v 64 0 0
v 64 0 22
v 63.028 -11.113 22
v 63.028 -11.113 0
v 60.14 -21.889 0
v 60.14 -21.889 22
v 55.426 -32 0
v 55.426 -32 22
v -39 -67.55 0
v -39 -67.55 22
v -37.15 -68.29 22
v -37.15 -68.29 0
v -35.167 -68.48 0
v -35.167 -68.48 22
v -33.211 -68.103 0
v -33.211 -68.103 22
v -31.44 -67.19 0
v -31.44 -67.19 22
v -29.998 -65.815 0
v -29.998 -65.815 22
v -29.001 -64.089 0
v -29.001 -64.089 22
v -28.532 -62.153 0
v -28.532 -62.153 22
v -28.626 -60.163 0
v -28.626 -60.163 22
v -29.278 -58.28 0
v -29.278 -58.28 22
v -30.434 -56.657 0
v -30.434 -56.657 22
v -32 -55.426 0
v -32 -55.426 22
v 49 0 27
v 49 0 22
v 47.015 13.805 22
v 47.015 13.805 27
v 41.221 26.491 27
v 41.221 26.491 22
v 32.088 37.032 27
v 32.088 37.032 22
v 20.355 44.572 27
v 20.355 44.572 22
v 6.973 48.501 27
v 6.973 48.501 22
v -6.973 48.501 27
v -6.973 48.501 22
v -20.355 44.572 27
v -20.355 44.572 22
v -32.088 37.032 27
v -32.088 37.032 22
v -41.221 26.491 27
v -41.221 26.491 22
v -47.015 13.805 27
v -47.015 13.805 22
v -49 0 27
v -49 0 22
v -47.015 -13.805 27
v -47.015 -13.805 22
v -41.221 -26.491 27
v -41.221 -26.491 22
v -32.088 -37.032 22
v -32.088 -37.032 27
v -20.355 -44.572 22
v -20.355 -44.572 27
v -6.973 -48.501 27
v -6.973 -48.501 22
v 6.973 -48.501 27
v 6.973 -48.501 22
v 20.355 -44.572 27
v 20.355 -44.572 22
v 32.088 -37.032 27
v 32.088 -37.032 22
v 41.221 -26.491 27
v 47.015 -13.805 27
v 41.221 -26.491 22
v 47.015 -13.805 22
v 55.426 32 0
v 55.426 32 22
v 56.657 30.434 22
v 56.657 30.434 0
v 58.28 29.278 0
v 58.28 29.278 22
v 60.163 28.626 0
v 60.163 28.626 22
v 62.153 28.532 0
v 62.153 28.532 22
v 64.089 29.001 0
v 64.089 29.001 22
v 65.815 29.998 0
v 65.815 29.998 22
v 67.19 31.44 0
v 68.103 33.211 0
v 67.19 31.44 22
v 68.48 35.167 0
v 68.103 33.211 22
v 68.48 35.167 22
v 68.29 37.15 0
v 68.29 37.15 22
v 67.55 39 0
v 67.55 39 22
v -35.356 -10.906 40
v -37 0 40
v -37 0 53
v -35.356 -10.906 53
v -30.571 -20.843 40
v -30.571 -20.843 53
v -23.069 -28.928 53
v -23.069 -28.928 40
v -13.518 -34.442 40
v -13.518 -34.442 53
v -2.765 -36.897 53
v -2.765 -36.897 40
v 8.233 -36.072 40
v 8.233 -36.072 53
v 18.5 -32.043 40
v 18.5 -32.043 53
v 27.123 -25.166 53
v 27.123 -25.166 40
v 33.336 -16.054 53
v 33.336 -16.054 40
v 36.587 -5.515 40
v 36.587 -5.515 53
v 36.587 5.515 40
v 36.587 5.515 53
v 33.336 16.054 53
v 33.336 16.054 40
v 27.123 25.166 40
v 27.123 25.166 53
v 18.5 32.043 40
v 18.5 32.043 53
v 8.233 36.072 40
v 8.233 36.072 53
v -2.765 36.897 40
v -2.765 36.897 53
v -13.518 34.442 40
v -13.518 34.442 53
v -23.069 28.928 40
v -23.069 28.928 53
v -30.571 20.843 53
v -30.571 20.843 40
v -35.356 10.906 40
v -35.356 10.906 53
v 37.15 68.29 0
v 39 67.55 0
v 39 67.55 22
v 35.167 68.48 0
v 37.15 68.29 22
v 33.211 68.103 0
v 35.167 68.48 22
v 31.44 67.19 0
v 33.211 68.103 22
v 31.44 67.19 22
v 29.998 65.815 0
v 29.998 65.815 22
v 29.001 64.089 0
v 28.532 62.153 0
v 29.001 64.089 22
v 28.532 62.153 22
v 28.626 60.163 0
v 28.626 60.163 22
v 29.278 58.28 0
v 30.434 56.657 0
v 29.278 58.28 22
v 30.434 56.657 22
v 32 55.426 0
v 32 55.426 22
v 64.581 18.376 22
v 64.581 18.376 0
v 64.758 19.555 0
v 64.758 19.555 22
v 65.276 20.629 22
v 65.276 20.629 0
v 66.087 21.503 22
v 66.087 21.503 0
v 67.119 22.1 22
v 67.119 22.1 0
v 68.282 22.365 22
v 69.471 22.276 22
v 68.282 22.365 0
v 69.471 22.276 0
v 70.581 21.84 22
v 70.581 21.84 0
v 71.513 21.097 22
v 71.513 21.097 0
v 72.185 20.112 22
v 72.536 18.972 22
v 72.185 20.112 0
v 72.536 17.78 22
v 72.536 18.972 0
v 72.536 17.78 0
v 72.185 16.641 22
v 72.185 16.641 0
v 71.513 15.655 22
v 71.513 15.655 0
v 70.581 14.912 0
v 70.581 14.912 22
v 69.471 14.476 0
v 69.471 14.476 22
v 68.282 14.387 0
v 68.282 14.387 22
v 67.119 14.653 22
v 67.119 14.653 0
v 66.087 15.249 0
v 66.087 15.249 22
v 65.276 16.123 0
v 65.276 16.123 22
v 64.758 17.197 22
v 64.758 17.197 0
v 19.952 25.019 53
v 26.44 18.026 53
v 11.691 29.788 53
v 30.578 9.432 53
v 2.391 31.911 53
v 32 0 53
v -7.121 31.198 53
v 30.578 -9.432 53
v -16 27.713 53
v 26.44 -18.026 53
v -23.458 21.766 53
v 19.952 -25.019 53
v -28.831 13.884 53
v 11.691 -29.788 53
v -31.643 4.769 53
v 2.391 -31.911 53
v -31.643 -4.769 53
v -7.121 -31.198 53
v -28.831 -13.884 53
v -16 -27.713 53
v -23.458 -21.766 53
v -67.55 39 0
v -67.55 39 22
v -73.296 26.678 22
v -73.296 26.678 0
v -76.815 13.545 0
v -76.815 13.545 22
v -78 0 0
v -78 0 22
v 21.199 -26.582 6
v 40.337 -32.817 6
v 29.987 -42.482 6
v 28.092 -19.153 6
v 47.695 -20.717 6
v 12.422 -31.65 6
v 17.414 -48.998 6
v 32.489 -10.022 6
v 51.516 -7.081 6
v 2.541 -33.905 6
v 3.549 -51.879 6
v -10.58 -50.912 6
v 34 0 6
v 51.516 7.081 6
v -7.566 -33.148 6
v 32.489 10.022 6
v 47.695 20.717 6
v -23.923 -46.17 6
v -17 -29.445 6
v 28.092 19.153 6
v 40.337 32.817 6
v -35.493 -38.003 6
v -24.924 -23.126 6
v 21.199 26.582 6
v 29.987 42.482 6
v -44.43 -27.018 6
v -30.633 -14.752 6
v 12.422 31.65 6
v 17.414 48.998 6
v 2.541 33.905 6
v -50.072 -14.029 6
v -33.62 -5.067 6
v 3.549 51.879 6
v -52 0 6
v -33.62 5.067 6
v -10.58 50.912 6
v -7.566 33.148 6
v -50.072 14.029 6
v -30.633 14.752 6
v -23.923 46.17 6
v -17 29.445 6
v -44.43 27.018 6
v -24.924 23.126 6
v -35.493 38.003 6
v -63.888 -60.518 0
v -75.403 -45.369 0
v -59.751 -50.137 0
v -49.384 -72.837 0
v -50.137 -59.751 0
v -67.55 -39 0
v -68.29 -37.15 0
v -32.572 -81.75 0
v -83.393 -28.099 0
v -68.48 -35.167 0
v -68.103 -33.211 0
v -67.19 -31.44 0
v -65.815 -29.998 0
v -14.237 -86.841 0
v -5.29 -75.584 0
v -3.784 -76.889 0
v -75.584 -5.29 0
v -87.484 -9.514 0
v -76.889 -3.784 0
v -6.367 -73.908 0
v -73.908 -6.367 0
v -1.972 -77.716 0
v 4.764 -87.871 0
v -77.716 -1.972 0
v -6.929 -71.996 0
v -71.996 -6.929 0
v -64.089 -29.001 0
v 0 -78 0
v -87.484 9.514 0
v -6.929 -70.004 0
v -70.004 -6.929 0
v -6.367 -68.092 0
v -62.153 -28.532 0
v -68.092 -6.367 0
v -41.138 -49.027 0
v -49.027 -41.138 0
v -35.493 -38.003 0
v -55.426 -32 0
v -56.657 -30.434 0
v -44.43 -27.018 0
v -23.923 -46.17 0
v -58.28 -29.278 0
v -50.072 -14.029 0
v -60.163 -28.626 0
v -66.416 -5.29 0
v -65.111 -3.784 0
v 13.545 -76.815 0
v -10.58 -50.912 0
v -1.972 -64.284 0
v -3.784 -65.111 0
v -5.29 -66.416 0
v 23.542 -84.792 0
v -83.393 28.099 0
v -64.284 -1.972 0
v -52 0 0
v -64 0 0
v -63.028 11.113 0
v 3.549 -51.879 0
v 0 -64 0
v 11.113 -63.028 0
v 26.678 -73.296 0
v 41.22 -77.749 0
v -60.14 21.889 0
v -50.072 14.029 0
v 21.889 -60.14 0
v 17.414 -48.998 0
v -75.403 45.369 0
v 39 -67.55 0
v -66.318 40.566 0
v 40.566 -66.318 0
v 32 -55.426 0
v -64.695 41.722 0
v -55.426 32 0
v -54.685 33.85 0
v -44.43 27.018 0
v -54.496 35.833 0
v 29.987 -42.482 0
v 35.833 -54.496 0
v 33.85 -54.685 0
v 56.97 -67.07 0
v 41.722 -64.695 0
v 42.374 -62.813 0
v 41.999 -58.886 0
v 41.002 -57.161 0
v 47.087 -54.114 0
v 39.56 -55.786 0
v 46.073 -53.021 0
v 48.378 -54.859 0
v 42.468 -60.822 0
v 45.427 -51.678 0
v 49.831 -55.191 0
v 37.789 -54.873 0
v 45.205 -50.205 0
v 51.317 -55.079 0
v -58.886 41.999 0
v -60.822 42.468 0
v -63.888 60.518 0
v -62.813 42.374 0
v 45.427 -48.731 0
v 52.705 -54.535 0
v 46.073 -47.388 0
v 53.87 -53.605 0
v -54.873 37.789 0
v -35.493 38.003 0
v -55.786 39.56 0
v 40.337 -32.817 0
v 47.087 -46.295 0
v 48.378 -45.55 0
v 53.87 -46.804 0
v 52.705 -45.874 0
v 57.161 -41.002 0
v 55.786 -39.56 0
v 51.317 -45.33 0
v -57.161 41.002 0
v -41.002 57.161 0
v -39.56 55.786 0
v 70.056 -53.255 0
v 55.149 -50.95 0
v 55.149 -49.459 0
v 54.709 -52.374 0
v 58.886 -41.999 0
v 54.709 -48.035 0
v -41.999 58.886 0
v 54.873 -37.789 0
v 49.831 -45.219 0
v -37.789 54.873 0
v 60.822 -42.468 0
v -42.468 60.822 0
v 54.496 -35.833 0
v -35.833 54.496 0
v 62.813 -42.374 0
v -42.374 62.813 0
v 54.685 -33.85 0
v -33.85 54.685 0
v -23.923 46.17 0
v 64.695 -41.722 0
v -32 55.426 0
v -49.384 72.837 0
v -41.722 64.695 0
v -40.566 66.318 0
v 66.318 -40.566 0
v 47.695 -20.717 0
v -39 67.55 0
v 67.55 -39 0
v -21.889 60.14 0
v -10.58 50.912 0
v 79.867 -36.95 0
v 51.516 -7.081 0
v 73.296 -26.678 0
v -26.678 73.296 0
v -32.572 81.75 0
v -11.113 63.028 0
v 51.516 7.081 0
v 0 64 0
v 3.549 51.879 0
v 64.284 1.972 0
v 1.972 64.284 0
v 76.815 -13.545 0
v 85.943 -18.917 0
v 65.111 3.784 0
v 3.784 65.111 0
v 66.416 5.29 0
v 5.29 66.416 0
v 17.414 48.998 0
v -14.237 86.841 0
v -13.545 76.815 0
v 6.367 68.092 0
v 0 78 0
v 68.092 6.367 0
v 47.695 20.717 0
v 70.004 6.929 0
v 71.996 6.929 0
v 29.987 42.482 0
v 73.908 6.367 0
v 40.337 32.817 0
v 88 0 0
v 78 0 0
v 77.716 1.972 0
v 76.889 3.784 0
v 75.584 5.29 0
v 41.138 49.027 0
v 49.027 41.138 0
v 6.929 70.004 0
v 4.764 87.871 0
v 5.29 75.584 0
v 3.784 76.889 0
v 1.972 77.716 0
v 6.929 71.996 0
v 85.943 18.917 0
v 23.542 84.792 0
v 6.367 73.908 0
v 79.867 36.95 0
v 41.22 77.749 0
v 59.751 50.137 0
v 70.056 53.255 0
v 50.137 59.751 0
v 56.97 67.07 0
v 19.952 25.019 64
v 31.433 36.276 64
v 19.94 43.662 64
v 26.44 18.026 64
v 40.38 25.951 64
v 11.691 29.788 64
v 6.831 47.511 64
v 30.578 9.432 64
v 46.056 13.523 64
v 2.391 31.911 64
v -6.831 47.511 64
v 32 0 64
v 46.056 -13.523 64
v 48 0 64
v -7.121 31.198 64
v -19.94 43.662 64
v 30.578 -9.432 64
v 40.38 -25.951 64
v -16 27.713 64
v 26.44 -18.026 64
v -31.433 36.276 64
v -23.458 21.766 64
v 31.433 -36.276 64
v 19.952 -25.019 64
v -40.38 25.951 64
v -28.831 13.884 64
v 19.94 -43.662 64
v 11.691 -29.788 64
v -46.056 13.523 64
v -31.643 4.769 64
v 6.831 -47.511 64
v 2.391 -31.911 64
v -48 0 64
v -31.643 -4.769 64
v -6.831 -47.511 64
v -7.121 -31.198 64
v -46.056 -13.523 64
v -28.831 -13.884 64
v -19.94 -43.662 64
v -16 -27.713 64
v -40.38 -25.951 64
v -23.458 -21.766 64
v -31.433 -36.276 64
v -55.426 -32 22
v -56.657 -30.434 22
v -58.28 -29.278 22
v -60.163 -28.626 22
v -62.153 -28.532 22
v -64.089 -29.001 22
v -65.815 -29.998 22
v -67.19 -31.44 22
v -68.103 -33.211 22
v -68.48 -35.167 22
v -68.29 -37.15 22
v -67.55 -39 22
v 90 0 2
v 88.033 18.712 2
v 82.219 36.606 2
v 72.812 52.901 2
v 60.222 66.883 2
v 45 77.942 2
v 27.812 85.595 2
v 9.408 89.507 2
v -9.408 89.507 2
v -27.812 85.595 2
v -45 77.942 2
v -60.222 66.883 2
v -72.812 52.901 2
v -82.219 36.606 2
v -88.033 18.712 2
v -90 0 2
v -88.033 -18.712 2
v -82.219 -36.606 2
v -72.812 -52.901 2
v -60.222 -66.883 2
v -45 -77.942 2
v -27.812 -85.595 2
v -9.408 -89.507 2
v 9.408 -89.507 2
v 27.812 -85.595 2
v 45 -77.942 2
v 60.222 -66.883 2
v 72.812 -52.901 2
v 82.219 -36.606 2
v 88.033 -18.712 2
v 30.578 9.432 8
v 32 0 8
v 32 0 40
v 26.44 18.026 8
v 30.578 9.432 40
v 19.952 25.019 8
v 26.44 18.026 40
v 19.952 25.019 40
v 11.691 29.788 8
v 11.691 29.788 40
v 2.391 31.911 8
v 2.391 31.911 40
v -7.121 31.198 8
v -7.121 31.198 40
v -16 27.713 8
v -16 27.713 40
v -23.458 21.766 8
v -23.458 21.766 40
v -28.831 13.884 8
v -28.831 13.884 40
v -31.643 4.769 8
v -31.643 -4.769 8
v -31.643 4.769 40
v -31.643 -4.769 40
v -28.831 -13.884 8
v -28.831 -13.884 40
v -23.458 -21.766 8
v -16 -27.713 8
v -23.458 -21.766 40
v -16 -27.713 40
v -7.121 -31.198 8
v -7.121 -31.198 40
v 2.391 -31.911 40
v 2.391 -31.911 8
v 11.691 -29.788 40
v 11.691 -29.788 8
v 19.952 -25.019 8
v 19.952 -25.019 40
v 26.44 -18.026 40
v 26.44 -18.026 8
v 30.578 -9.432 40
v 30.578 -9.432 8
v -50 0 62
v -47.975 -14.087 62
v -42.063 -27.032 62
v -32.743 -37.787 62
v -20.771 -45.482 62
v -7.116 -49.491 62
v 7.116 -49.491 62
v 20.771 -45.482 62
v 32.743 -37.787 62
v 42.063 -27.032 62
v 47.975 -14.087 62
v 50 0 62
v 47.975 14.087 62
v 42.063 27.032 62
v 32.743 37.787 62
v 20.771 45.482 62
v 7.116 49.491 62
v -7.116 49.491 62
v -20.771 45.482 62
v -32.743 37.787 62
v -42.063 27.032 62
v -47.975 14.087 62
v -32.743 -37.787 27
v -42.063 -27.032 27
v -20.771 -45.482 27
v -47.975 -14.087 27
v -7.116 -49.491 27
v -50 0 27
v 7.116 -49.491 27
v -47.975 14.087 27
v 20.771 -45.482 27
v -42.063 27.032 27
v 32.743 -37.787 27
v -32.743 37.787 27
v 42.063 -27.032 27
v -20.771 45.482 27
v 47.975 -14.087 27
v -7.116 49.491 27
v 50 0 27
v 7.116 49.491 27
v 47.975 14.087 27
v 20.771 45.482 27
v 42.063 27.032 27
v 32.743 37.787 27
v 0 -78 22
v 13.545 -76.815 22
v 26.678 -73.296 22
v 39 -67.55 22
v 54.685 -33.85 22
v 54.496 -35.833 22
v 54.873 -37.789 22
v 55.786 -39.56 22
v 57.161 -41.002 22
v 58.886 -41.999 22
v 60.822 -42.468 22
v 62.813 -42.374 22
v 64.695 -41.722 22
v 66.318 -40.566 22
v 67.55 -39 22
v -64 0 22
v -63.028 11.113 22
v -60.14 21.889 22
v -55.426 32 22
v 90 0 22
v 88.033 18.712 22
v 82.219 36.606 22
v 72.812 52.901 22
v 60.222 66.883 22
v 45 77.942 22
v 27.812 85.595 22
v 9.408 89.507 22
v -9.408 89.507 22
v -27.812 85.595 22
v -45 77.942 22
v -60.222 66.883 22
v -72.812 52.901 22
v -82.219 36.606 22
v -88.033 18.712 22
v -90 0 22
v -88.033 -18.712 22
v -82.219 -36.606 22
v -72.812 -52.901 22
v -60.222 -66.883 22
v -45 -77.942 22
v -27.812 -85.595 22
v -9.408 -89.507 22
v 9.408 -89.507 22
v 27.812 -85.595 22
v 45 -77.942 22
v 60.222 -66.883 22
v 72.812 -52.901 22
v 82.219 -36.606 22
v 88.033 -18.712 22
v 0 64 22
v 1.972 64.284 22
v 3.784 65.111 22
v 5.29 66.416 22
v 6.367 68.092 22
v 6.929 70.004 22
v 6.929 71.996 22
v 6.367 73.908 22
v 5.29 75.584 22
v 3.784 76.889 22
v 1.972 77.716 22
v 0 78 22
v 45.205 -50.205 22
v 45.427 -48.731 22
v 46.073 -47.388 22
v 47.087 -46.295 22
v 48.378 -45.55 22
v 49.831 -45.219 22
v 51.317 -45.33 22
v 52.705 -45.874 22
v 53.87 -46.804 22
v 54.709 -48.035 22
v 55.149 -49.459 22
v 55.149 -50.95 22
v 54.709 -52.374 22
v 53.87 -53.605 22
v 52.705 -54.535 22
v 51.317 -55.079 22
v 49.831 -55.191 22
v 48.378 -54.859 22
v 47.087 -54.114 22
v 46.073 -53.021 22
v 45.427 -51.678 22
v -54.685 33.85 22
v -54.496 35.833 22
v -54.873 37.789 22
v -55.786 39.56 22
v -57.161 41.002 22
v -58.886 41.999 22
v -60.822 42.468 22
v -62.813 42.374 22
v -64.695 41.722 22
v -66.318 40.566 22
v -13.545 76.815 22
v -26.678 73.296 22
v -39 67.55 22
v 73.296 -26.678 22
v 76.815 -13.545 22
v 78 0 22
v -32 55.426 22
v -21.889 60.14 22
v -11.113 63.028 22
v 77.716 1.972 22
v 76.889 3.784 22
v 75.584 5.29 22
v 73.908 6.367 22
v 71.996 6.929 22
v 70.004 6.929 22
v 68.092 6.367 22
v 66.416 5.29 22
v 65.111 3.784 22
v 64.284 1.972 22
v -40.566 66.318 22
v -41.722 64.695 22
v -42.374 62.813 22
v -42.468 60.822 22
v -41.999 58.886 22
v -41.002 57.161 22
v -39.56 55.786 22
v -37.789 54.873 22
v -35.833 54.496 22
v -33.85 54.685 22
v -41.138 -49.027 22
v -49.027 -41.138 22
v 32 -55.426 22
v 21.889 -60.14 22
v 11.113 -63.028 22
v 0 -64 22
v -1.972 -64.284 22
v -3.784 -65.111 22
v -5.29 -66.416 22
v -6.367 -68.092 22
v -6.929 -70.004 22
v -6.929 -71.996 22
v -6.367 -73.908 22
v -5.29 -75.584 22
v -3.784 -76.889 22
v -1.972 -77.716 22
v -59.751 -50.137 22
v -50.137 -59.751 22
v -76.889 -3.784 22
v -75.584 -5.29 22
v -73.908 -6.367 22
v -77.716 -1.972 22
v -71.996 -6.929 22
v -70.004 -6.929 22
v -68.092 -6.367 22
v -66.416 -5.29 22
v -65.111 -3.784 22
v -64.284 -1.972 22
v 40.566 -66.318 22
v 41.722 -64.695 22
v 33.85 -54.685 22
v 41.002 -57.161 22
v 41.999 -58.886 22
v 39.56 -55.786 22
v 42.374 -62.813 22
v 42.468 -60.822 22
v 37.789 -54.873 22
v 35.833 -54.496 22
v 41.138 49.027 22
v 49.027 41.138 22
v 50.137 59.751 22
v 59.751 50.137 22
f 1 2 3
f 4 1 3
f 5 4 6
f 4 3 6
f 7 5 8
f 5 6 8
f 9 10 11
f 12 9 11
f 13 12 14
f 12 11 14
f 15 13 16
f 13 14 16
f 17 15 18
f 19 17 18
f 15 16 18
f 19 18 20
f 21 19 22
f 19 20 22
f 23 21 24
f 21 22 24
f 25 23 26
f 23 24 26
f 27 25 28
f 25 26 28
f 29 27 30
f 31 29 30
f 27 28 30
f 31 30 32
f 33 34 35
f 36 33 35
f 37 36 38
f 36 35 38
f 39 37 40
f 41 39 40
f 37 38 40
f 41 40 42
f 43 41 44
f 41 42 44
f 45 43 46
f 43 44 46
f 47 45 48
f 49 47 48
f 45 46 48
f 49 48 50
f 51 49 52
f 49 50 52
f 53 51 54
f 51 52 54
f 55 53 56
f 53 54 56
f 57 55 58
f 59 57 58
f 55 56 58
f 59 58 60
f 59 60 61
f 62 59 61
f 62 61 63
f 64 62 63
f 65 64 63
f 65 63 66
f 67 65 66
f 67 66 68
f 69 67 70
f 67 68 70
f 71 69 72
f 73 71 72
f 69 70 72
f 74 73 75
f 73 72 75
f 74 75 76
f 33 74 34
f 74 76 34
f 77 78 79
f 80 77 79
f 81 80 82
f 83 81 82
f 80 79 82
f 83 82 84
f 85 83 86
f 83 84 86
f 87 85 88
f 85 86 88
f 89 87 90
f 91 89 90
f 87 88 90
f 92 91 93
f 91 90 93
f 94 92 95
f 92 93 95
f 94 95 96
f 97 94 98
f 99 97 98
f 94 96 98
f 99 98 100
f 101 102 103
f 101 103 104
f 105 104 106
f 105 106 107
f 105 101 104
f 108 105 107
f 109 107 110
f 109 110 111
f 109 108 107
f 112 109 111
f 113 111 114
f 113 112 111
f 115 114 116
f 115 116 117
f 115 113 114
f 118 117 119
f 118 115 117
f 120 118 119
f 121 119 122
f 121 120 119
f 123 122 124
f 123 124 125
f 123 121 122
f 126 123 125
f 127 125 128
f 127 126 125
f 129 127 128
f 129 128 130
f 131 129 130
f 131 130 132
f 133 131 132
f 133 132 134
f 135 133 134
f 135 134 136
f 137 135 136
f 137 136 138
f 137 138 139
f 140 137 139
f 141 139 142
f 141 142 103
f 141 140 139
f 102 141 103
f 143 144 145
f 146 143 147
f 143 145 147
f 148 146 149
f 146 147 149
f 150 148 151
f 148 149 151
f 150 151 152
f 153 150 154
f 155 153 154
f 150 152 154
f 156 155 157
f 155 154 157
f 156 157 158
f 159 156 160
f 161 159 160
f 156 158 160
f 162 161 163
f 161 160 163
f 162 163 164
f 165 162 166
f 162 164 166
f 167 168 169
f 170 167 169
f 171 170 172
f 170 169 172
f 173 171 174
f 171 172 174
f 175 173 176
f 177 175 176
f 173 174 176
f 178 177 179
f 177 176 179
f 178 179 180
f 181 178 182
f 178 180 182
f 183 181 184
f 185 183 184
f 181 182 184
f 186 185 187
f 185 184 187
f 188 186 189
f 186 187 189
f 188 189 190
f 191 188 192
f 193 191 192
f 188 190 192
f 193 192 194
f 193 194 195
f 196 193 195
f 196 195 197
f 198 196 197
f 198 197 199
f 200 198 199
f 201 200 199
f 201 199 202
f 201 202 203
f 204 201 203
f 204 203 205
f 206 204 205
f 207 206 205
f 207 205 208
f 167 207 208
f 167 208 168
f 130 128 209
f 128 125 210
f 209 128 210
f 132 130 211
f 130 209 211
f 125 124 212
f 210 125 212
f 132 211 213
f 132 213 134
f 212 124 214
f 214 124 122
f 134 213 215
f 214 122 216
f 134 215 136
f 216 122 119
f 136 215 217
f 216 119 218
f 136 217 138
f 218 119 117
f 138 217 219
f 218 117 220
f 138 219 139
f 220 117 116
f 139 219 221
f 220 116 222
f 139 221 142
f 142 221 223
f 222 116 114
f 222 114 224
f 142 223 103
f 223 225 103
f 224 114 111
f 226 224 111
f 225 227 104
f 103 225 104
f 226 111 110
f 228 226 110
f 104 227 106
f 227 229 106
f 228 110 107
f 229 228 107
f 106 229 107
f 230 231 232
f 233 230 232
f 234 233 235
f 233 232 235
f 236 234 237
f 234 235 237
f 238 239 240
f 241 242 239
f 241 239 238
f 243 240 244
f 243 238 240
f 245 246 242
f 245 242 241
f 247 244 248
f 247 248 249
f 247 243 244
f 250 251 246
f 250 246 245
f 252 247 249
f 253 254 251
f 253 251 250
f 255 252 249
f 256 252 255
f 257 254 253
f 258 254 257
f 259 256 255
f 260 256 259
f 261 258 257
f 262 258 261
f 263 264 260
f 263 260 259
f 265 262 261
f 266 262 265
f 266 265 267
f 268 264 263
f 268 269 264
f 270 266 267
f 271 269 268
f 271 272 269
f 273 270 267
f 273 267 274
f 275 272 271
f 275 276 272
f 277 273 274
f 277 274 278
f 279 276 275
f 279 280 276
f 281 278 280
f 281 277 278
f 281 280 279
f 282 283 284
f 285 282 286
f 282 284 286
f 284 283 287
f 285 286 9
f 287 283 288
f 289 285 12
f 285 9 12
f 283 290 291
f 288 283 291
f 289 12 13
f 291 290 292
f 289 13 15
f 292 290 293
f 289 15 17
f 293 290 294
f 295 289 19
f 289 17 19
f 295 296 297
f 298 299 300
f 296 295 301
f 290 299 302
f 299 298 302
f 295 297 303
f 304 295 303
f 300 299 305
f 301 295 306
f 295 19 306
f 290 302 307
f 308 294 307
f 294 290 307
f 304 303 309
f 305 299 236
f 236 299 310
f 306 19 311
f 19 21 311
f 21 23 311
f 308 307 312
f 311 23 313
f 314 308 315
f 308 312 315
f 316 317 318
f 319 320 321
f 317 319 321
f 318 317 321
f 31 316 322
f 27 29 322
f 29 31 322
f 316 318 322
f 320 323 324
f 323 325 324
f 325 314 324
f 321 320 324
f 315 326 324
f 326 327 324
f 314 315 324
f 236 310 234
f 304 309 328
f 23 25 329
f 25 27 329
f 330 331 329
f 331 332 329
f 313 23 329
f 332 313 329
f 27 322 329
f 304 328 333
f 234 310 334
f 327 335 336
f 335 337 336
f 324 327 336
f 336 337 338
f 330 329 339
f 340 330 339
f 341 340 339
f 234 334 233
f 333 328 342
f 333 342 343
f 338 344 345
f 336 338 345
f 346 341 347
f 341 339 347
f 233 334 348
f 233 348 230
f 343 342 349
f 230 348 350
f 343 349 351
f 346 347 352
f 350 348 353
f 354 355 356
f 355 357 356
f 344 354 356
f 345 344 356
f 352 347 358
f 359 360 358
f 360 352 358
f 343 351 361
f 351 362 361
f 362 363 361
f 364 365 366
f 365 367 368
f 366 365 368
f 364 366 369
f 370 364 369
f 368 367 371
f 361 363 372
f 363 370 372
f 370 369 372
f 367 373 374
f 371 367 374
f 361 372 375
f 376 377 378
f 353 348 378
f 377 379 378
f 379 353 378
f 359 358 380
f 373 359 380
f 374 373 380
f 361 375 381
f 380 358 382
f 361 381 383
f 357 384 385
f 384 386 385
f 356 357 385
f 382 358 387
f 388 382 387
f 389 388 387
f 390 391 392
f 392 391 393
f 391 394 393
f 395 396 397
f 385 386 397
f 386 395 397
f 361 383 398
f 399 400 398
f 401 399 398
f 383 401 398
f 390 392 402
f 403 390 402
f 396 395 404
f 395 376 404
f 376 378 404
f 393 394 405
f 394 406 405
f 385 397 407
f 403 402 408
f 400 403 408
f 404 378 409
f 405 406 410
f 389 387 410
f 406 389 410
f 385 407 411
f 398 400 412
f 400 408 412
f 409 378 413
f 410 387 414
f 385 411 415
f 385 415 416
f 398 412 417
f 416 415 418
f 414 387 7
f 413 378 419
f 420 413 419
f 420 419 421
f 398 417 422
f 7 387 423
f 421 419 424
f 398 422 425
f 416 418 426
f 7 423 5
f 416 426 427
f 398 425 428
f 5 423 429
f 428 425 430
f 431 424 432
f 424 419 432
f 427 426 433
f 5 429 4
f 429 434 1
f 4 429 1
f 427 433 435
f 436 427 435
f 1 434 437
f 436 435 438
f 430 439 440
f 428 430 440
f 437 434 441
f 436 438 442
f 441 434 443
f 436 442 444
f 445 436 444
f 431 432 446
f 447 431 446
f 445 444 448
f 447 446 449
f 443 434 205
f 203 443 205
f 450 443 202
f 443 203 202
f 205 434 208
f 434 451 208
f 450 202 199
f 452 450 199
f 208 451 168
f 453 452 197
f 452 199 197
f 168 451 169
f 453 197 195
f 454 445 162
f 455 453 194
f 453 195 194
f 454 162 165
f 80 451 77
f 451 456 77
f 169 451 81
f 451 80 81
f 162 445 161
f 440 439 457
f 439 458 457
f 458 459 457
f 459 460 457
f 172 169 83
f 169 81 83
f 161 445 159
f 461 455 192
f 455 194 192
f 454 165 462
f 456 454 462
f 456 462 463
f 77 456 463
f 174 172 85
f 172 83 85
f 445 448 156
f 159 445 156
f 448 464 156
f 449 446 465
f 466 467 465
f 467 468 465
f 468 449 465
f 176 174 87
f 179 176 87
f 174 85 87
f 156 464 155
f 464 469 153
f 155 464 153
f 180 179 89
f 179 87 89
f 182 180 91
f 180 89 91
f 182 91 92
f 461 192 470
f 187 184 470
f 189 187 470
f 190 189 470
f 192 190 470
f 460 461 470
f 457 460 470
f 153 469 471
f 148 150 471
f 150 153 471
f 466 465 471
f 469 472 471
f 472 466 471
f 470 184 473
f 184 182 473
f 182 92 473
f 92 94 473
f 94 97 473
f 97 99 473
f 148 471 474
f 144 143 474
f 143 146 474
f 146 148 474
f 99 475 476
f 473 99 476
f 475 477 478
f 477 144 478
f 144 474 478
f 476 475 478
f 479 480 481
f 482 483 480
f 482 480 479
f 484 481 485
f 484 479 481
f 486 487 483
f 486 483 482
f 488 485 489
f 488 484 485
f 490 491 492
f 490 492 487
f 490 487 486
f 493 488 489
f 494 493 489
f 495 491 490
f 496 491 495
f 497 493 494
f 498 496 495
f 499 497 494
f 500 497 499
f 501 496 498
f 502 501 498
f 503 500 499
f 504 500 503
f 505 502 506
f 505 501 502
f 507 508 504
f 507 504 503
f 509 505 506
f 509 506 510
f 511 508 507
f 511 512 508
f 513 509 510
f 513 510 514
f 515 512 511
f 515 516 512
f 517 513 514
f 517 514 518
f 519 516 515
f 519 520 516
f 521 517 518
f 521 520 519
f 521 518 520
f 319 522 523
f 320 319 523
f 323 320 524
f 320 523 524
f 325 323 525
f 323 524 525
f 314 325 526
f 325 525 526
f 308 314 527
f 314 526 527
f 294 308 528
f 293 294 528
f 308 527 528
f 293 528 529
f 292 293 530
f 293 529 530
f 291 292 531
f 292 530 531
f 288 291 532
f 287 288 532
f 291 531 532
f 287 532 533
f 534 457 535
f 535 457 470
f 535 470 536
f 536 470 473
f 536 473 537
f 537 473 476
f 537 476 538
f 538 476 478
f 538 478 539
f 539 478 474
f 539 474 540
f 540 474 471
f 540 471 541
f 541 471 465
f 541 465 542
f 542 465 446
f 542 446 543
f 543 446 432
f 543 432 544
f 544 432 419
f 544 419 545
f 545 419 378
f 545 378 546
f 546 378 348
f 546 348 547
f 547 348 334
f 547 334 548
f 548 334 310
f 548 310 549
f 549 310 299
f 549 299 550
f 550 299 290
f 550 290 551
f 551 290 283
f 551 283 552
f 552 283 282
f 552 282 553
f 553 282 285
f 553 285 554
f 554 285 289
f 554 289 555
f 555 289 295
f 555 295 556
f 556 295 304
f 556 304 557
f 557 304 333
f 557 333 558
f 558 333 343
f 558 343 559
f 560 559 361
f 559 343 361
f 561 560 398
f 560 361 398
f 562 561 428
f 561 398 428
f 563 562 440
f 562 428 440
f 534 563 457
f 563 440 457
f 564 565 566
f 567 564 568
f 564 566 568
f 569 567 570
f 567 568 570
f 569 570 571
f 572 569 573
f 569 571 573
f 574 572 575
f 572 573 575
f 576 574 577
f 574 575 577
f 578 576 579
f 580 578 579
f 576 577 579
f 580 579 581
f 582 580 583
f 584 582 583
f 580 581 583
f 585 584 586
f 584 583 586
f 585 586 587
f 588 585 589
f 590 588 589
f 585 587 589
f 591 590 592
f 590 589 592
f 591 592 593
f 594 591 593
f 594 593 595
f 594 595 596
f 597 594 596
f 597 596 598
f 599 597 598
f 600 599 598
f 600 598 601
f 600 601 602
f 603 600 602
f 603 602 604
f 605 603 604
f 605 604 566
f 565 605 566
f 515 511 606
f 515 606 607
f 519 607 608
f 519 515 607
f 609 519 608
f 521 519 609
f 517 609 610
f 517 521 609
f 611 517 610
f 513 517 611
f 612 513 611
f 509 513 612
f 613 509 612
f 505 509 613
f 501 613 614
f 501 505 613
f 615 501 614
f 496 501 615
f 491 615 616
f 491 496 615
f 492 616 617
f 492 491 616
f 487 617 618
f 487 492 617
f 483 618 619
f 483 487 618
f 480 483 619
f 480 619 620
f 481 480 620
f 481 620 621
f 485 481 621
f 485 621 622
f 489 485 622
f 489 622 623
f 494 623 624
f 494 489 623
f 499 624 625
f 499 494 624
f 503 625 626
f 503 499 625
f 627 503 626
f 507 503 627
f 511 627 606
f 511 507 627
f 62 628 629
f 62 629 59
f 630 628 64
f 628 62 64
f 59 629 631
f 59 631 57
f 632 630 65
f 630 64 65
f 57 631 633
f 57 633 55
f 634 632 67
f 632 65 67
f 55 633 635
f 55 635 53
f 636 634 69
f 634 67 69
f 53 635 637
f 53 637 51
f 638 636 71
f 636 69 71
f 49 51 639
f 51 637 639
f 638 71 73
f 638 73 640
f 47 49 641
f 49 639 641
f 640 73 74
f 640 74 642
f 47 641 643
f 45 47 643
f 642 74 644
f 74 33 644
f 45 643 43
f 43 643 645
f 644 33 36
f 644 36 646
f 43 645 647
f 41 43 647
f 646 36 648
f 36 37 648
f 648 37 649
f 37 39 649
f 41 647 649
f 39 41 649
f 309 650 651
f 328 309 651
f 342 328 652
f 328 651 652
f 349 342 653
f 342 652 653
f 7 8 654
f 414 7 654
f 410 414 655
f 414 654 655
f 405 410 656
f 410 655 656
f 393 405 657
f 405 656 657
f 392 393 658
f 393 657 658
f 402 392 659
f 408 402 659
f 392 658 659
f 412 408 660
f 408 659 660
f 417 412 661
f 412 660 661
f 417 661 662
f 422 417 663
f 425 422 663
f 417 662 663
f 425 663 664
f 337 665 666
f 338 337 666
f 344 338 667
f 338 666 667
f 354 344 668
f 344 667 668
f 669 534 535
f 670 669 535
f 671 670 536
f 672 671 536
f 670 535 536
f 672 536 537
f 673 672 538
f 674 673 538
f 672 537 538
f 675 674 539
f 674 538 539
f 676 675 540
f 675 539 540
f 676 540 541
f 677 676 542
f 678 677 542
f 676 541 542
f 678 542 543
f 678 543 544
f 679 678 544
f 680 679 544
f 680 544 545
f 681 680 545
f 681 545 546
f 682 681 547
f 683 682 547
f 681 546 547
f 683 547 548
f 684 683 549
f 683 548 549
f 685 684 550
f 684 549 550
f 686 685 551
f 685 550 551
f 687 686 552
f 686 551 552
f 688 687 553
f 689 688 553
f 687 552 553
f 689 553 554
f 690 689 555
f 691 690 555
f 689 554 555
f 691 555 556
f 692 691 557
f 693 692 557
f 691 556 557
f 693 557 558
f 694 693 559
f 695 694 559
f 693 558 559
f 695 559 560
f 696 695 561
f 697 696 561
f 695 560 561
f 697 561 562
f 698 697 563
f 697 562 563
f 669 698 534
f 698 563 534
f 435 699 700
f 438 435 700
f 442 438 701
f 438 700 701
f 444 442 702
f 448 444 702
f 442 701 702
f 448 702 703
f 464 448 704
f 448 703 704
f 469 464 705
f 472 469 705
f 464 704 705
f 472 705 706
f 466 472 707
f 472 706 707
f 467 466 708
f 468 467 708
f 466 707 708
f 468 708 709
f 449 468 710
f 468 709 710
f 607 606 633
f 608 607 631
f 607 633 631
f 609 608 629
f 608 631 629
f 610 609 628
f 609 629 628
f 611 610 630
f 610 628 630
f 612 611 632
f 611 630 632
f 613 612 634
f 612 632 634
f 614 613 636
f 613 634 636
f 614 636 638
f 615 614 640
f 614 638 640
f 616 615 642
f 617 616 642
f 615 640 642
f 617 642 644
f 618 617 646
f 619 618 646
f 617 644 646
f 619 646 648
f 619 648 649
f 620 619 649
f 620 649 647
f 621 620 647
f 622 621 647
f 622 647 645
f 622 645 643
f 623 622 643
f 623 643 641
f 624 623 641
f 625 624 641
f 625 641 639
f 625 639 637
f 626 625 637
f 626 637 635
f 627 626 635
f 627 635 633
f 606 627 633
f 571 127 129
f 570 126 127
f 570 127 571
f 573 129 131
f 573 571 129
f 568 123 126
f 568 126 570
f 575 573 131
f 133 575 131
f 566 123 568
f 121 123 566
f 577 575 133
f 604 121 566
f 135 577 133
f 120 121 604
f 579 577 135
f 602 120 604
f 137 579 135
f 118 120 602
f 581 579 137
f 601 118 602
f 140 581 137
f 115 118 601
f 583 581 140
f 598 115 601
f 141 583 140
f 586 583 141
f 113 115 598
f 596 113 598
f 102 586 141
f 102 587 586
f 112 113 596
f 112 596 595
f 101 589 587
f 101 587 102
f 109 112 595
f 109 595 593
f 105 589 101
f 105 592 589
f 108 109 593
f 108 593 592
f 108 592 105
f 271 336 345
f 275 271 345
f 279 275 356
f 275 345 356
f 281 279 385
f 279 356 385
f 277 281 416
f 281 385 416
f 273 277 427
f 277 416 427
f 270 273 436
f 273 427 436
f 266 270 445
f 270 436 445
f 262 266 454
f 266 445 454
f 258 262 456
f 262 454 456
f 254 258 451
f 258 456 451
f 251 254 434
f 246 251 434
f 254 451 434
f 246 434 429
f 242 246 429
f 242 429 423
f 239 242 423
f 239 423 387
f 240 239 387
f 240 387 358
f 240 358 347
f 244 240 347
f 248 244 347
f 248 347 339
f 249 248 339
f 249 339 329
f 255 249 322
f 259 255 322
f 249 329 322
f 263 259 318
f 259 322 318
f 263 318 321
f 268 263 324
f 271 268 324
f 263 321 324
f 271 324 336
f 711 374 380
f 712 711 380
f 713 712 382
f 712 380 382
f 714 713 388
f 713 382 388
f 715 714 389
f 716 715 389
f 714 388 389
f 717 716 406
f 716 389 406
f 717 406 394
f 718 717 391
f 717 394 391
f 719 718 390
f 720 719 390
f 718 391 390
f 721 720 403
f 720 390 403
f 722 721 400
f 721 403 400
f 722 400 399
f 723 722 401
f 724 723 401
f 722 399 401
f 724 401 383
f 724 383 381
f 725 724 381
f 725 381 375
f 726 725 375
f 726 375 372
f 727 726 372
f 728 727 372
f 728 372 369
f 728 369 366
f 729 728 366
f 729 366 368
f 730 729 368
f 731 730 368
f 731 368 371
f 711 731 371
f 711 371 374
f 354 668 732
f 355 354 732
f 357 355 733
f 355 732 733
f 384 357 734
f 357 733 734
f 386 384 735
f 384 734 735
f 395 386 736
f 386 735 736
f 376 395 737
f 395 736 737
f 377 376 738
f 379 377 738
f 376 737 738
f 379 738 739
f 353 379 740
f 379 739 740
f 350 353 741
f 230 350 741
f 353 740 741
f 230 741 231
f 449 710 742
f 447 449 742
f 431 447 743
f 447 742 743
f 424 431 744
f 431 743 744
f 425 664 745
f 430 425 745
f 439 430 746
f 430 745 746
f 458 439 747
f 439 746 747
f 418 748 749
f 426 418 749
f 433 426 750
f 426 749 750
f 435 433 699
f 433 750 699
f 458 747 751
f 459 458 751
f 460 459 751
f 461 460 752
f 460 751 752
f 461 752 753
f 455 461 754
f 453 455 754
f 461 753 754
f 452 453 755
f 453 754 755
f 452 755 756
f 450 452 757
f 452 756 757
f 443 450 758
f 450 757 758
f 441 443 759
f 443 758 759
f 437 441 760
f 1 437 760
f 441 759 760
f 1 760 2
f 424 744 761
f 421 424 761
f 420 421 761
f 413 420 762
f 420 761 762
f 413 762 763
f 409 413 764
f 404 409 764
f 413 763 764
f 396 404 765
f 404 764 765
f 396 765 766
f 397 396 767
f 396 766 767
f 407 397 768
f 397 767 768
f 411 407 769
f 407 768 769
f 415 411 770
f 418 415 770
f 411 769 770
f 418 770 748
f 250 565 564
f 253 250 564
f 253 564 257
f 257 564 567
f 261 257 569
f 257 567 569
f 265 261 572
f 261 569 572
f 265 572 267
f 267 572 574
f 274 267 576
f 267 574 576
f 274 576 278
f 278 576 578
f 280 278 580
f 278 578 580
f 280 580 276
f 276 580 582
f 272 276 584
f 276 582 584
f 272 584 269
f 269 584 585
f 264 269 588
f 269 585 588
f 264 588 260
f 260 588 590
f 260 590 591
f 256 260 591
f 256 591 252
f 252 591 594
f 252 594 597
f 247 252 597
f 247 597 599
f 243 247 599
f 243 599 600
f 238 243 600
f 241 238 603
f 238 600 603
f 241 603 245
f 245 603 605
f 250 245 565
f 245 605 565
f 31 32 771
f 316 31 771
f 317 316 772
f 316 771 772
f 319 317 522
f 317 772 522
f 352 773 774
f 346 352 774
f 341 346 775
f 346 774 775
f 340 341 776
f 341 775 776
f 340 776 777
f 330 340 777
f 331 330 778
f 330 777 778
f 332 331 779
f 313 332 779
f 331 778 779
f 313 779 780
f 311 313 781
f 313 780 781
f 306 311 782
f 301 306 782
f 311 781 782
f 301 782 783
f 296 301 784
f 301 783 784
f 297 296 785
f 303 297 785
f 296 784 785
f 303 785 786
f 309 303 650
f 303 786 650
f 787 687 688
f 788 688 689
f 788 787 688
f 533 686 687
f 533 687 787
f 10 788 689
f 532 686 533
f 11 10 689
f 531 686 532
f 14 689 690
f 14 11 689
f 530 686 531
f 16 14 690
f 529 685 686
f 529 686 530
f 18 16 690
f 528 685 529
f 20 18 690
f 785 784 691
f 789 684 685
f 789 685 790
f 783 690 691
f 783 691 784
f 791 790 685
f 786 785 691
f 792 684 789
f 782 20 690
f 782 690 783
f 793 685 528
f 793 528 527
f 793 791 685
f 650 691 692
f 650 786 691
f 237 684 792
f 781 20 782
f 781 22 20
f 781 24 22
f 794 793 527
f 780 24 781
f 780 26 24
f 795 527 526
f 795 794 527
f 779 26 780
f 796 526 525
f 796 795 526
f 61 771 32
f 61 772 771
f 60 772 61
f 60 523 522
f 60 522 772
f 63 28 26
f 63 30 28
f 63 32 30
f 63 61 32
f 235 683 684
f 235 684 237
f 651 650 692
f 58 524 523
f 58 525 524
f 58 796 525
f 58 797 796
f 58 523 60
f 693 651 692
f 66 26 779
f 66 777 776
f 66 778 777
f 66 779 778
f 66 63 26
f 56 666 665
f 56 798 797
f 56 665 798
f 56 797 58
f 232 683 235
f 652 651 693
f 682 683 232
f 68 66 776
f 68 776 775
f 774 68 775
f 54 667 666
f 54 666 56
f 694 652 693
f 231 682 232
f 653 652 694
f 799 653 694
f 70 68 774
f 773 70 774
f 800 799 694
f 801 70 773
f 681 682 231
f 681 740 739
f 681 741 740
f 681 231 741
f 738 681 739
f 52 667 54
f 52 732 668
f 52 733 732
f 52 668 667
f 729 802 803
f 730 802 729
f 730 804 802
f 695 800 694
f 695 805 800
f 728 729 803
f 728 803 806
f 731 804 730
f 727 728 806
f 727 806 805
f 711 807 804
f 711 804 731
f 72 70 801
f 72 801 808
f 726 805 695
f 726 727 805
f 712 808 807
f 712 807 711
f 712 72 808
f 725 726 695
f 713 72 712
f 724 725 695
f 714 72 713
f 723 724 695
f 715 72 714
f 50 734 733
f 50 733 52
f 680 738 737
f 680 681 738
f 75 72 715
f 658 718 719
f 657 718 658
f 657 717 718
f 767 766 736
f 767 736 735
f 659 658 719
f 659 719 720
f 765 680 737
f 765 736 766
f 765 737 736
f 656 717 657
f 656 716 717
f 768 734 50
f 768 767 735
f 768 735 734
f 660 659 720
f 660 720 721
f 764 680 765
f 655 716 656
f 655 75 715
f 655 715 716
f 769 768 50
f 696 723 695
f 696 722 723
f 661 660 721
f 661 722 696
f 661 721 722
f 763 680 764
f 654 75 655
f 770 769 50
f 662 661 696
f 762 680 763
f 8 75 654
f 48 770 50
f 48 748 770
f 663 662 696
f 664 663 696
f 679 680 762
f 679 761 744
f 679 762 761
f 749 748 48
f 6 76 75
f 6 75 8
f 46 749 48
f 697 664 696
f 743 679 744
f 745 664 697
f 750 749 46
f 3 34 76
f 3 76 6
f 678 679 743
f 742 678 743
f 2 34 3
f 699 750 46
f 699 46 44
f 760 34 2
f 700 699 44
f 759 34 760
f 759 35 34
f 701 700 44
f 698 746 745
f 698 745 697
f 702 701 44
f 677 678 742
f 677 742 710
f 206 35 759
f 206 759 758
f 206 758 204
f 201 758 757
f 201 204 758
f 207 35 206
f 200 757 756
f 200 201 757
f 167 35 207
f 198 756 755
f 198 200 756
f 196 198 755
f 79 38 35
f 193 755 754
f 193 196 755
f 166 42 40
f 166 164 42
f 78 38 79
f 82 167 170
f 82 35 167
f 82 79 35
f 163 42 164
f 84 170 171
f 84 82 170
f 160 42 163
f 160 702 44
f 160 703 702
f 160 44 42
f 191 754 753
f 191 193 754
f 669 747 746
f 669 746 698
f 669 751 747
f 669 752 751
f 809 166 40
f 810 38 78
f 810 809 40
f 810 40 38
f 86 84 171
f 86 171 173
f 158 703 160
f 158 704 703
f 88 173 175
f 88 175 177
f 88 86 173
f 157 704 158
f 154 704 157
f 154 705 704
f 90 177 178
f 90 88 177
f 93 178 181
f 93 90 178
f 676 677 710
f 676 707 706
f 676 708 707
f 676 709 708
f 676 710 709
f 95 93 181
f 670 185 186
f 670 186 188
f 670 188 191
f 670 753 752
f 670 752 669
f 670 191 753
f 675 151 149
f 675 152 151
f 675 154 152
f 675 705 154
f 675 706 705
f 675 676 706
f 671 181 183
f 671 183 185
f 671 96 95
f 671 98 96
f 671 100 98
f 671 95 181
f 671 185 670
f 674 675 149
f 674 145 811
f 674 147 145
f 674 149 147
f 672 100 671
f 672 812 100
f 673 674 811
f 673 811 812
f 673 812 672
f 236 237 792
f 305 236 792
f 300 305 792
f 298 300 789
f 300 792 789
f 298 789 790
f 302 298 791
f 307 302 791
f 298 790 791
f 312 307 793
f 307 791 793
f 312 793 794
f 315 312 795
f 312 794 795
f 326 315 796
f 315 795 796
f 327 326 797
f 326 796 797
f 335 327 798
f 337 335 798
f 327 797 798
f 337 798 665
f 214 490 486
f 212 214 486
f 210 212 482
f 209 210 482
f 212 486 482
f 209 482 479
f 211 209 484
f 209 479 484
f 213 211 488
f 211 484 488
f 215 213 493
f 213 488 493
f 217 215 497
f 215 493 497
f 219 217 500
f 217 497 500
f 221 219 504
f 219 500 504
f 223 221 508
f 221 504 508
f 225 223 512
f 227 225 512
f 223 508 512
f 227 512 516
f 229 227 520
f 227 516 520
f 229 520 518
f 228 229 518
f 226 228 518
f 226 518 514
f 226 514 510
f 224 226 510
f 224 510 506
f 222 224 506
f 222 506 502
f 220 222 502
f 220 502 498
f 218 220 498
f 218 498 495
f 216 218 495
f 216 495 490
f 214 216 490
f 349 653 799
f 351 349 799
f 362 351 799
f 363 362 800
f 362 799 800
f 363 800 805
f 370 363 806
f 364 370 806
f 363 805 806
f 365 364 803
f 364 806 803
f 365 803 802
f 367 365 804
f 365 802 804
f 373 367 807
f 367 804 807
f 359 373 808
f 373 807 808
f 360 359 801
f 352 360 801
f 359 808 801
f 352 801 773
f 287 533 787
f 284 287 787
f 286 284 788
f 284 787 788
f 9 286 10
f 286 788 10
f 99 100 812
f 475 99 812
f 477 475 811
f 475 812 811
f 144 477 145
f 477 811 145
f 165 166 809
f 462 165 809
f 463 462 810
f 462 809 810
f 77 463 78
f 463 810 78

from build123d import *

# Parameters (mm, degrees)
SKETCH_1_R               = 90
EXTRUDE_1_DEPTH          = 22
SKETCH_2_R               = 50
EXTRUDE_2_DEPTH          = 42
SKETCH_3_OUTSIDE_W       = 234.496
SKETCH_3_OUTSIDE_H       = 234.496
SKETCH_3_OUTSIDE_R       = 49
CUT_EXTRUDE_1_DEPTH      = 5
SKETCH_4_R               = 32
CUT_EXTRUDE_2_DEPTH      = 143.464030548
CUT_EXTRUDE_START        = -24
SKETCH_5_R               = 37
CUT_EXTRUDE_3_DEPTH      = 13
SKETCH_6_R               = 52
CUT_EXTRUDE_4_DEPTH      = 6
CHAMFER_1_SIZE           = 2
CUT_EXTRUDE_5_DEPTH      = 135.029847422
PATTERN_CIRCULAR_1_COUNT = 6
F_10_0MM_2_D             = 10
F_8_0MM_1_D              = 8


with BuildPart() as part:
    # 草图1 → 凸台-拉伸1 (new body)
    with BuildSketch(Plane.XY):
        Circle(SKETCH_1_R)
    extrude(amount=EXTRUDE_1_DEPTH)

    # 草图2 → 凸台-拉伸2 (add)
    with BuildSketch(Plane.XY.offset(22)):
        with Locations(Location((0, 0, 0), (0, 0, 180))):
            Circle(SKETCH_2_R)
    extrude(amount=EXTRUDE_2_DEPTH)

    # 草图3 outside → 切除-拉伸1 (cut)
    with BuildSketch(Plane.XY.offset(22)):
        Rectangle(SKETCH_3_OUTSIDE_W, SKETCH_3_OUTSIDE_H)
        Circle(SKETCH_3_OUTSIDE_R, mode=Mode.SUBTRACT)
    extrude(amount=CUT_EXTRUDE_1_DEPTH, mode=Mode.SUBTRACT)

    # 草图4 → 切除-拉伸2 (cut, through all)
    with BuildSketch(Plane.XY.offset(64)):
        Circle(SKETCH_4_R)
    extrude(amount=-CUT_EXTRUDE_2_DEPTH, mode=Mode.SUBTRACT)

    # 草图5 → 切除-拉伸3 (cut)
    with BuildSketch(Plane.XY.offset(64).offset(CUT_EXTRUDE_START)):
        with Locations(Location((0, 0, 0), (0, 0, 180))):
            Circle(SKETCH_5_R)
    extrude(amount=CUT_EXTRUDE_3_DEPTH, mode=Mode.SUBTRACT)

    # 草图6 → 切除-拉伸4 (cut)
    with BuildSketch(Plane(origin=(0, 0, 0), x_dir=(-1, 0, 0), z_dir=(0, 0, -1))):
        Circle(SKETCH_6_R)
    extrude(amount=-CUT_EXTRUDE_4_DEPTH, mode=Mode.SUBTRACT)

    # 倒角1
    chamfer_1_edges = [part.edges().sort_by_distance(p)[0] for p in [
        (-90, 0, 0),
        (-32, 0, 6),
        (50, 0, 64),
    ]]
    chamfer(chamfer_1_edges, length=CHAMFER_1_SIZE)

    # 草图7 → 切除-拉伸5 (cut, through all)
    with BuildSketch(Plane.XY.offset(22)):
        with BuildLine():
            ThreePointArc((0, 78), (-20.187885518, 75.342214451), (-39, 67.549981495))
            ThreePointArc((-39, 67.549981495), (-41.562177826, 57.987803669), (-32, 55.425625842))
            ThreePointArc((-32, 55.425625842), (-16.564418887, 61.819252883), (0, 64))
            ThreePointArc((0, 64), (7, 71), (0, 78))
        make_face()
    cut_extrude_5 = extrude(amount=-CUT_EXTRUDE_5_DEPTH, mode=Mode.SUBTRACT)

    # 阵列(圆周)1: 切除-拉伸5 ×6 about axis
    pattern_circular_1_axis = Axis((0, 0, 0), (0, 0, 1))
    for i in range(1, PATTERN_CIRCULAR_1_COUNT):
        add(cut_extrude_5.rotate(pattern_circular_1_axis, i * 360 / PATTERN_CIRCULAR_1_COUNT), mode=Mode.SUBTRACT)

    # Ø10.0mm 暗销孔2 (through all)
    with Locations(Plane.XY.offset(22)):
        with Locations((50.204581464, -50.204581464)):
            Hole(F_10_0MM_2_D / 2)

    # Ø8.0mm 暗销孔1 (through all)
    with Locations(Plane.XY.offset(22)):
        with Locations((68.580733667, 18.376152202)):
            Hole(F_8_0MM_1_D / 2)


solid = part.part
